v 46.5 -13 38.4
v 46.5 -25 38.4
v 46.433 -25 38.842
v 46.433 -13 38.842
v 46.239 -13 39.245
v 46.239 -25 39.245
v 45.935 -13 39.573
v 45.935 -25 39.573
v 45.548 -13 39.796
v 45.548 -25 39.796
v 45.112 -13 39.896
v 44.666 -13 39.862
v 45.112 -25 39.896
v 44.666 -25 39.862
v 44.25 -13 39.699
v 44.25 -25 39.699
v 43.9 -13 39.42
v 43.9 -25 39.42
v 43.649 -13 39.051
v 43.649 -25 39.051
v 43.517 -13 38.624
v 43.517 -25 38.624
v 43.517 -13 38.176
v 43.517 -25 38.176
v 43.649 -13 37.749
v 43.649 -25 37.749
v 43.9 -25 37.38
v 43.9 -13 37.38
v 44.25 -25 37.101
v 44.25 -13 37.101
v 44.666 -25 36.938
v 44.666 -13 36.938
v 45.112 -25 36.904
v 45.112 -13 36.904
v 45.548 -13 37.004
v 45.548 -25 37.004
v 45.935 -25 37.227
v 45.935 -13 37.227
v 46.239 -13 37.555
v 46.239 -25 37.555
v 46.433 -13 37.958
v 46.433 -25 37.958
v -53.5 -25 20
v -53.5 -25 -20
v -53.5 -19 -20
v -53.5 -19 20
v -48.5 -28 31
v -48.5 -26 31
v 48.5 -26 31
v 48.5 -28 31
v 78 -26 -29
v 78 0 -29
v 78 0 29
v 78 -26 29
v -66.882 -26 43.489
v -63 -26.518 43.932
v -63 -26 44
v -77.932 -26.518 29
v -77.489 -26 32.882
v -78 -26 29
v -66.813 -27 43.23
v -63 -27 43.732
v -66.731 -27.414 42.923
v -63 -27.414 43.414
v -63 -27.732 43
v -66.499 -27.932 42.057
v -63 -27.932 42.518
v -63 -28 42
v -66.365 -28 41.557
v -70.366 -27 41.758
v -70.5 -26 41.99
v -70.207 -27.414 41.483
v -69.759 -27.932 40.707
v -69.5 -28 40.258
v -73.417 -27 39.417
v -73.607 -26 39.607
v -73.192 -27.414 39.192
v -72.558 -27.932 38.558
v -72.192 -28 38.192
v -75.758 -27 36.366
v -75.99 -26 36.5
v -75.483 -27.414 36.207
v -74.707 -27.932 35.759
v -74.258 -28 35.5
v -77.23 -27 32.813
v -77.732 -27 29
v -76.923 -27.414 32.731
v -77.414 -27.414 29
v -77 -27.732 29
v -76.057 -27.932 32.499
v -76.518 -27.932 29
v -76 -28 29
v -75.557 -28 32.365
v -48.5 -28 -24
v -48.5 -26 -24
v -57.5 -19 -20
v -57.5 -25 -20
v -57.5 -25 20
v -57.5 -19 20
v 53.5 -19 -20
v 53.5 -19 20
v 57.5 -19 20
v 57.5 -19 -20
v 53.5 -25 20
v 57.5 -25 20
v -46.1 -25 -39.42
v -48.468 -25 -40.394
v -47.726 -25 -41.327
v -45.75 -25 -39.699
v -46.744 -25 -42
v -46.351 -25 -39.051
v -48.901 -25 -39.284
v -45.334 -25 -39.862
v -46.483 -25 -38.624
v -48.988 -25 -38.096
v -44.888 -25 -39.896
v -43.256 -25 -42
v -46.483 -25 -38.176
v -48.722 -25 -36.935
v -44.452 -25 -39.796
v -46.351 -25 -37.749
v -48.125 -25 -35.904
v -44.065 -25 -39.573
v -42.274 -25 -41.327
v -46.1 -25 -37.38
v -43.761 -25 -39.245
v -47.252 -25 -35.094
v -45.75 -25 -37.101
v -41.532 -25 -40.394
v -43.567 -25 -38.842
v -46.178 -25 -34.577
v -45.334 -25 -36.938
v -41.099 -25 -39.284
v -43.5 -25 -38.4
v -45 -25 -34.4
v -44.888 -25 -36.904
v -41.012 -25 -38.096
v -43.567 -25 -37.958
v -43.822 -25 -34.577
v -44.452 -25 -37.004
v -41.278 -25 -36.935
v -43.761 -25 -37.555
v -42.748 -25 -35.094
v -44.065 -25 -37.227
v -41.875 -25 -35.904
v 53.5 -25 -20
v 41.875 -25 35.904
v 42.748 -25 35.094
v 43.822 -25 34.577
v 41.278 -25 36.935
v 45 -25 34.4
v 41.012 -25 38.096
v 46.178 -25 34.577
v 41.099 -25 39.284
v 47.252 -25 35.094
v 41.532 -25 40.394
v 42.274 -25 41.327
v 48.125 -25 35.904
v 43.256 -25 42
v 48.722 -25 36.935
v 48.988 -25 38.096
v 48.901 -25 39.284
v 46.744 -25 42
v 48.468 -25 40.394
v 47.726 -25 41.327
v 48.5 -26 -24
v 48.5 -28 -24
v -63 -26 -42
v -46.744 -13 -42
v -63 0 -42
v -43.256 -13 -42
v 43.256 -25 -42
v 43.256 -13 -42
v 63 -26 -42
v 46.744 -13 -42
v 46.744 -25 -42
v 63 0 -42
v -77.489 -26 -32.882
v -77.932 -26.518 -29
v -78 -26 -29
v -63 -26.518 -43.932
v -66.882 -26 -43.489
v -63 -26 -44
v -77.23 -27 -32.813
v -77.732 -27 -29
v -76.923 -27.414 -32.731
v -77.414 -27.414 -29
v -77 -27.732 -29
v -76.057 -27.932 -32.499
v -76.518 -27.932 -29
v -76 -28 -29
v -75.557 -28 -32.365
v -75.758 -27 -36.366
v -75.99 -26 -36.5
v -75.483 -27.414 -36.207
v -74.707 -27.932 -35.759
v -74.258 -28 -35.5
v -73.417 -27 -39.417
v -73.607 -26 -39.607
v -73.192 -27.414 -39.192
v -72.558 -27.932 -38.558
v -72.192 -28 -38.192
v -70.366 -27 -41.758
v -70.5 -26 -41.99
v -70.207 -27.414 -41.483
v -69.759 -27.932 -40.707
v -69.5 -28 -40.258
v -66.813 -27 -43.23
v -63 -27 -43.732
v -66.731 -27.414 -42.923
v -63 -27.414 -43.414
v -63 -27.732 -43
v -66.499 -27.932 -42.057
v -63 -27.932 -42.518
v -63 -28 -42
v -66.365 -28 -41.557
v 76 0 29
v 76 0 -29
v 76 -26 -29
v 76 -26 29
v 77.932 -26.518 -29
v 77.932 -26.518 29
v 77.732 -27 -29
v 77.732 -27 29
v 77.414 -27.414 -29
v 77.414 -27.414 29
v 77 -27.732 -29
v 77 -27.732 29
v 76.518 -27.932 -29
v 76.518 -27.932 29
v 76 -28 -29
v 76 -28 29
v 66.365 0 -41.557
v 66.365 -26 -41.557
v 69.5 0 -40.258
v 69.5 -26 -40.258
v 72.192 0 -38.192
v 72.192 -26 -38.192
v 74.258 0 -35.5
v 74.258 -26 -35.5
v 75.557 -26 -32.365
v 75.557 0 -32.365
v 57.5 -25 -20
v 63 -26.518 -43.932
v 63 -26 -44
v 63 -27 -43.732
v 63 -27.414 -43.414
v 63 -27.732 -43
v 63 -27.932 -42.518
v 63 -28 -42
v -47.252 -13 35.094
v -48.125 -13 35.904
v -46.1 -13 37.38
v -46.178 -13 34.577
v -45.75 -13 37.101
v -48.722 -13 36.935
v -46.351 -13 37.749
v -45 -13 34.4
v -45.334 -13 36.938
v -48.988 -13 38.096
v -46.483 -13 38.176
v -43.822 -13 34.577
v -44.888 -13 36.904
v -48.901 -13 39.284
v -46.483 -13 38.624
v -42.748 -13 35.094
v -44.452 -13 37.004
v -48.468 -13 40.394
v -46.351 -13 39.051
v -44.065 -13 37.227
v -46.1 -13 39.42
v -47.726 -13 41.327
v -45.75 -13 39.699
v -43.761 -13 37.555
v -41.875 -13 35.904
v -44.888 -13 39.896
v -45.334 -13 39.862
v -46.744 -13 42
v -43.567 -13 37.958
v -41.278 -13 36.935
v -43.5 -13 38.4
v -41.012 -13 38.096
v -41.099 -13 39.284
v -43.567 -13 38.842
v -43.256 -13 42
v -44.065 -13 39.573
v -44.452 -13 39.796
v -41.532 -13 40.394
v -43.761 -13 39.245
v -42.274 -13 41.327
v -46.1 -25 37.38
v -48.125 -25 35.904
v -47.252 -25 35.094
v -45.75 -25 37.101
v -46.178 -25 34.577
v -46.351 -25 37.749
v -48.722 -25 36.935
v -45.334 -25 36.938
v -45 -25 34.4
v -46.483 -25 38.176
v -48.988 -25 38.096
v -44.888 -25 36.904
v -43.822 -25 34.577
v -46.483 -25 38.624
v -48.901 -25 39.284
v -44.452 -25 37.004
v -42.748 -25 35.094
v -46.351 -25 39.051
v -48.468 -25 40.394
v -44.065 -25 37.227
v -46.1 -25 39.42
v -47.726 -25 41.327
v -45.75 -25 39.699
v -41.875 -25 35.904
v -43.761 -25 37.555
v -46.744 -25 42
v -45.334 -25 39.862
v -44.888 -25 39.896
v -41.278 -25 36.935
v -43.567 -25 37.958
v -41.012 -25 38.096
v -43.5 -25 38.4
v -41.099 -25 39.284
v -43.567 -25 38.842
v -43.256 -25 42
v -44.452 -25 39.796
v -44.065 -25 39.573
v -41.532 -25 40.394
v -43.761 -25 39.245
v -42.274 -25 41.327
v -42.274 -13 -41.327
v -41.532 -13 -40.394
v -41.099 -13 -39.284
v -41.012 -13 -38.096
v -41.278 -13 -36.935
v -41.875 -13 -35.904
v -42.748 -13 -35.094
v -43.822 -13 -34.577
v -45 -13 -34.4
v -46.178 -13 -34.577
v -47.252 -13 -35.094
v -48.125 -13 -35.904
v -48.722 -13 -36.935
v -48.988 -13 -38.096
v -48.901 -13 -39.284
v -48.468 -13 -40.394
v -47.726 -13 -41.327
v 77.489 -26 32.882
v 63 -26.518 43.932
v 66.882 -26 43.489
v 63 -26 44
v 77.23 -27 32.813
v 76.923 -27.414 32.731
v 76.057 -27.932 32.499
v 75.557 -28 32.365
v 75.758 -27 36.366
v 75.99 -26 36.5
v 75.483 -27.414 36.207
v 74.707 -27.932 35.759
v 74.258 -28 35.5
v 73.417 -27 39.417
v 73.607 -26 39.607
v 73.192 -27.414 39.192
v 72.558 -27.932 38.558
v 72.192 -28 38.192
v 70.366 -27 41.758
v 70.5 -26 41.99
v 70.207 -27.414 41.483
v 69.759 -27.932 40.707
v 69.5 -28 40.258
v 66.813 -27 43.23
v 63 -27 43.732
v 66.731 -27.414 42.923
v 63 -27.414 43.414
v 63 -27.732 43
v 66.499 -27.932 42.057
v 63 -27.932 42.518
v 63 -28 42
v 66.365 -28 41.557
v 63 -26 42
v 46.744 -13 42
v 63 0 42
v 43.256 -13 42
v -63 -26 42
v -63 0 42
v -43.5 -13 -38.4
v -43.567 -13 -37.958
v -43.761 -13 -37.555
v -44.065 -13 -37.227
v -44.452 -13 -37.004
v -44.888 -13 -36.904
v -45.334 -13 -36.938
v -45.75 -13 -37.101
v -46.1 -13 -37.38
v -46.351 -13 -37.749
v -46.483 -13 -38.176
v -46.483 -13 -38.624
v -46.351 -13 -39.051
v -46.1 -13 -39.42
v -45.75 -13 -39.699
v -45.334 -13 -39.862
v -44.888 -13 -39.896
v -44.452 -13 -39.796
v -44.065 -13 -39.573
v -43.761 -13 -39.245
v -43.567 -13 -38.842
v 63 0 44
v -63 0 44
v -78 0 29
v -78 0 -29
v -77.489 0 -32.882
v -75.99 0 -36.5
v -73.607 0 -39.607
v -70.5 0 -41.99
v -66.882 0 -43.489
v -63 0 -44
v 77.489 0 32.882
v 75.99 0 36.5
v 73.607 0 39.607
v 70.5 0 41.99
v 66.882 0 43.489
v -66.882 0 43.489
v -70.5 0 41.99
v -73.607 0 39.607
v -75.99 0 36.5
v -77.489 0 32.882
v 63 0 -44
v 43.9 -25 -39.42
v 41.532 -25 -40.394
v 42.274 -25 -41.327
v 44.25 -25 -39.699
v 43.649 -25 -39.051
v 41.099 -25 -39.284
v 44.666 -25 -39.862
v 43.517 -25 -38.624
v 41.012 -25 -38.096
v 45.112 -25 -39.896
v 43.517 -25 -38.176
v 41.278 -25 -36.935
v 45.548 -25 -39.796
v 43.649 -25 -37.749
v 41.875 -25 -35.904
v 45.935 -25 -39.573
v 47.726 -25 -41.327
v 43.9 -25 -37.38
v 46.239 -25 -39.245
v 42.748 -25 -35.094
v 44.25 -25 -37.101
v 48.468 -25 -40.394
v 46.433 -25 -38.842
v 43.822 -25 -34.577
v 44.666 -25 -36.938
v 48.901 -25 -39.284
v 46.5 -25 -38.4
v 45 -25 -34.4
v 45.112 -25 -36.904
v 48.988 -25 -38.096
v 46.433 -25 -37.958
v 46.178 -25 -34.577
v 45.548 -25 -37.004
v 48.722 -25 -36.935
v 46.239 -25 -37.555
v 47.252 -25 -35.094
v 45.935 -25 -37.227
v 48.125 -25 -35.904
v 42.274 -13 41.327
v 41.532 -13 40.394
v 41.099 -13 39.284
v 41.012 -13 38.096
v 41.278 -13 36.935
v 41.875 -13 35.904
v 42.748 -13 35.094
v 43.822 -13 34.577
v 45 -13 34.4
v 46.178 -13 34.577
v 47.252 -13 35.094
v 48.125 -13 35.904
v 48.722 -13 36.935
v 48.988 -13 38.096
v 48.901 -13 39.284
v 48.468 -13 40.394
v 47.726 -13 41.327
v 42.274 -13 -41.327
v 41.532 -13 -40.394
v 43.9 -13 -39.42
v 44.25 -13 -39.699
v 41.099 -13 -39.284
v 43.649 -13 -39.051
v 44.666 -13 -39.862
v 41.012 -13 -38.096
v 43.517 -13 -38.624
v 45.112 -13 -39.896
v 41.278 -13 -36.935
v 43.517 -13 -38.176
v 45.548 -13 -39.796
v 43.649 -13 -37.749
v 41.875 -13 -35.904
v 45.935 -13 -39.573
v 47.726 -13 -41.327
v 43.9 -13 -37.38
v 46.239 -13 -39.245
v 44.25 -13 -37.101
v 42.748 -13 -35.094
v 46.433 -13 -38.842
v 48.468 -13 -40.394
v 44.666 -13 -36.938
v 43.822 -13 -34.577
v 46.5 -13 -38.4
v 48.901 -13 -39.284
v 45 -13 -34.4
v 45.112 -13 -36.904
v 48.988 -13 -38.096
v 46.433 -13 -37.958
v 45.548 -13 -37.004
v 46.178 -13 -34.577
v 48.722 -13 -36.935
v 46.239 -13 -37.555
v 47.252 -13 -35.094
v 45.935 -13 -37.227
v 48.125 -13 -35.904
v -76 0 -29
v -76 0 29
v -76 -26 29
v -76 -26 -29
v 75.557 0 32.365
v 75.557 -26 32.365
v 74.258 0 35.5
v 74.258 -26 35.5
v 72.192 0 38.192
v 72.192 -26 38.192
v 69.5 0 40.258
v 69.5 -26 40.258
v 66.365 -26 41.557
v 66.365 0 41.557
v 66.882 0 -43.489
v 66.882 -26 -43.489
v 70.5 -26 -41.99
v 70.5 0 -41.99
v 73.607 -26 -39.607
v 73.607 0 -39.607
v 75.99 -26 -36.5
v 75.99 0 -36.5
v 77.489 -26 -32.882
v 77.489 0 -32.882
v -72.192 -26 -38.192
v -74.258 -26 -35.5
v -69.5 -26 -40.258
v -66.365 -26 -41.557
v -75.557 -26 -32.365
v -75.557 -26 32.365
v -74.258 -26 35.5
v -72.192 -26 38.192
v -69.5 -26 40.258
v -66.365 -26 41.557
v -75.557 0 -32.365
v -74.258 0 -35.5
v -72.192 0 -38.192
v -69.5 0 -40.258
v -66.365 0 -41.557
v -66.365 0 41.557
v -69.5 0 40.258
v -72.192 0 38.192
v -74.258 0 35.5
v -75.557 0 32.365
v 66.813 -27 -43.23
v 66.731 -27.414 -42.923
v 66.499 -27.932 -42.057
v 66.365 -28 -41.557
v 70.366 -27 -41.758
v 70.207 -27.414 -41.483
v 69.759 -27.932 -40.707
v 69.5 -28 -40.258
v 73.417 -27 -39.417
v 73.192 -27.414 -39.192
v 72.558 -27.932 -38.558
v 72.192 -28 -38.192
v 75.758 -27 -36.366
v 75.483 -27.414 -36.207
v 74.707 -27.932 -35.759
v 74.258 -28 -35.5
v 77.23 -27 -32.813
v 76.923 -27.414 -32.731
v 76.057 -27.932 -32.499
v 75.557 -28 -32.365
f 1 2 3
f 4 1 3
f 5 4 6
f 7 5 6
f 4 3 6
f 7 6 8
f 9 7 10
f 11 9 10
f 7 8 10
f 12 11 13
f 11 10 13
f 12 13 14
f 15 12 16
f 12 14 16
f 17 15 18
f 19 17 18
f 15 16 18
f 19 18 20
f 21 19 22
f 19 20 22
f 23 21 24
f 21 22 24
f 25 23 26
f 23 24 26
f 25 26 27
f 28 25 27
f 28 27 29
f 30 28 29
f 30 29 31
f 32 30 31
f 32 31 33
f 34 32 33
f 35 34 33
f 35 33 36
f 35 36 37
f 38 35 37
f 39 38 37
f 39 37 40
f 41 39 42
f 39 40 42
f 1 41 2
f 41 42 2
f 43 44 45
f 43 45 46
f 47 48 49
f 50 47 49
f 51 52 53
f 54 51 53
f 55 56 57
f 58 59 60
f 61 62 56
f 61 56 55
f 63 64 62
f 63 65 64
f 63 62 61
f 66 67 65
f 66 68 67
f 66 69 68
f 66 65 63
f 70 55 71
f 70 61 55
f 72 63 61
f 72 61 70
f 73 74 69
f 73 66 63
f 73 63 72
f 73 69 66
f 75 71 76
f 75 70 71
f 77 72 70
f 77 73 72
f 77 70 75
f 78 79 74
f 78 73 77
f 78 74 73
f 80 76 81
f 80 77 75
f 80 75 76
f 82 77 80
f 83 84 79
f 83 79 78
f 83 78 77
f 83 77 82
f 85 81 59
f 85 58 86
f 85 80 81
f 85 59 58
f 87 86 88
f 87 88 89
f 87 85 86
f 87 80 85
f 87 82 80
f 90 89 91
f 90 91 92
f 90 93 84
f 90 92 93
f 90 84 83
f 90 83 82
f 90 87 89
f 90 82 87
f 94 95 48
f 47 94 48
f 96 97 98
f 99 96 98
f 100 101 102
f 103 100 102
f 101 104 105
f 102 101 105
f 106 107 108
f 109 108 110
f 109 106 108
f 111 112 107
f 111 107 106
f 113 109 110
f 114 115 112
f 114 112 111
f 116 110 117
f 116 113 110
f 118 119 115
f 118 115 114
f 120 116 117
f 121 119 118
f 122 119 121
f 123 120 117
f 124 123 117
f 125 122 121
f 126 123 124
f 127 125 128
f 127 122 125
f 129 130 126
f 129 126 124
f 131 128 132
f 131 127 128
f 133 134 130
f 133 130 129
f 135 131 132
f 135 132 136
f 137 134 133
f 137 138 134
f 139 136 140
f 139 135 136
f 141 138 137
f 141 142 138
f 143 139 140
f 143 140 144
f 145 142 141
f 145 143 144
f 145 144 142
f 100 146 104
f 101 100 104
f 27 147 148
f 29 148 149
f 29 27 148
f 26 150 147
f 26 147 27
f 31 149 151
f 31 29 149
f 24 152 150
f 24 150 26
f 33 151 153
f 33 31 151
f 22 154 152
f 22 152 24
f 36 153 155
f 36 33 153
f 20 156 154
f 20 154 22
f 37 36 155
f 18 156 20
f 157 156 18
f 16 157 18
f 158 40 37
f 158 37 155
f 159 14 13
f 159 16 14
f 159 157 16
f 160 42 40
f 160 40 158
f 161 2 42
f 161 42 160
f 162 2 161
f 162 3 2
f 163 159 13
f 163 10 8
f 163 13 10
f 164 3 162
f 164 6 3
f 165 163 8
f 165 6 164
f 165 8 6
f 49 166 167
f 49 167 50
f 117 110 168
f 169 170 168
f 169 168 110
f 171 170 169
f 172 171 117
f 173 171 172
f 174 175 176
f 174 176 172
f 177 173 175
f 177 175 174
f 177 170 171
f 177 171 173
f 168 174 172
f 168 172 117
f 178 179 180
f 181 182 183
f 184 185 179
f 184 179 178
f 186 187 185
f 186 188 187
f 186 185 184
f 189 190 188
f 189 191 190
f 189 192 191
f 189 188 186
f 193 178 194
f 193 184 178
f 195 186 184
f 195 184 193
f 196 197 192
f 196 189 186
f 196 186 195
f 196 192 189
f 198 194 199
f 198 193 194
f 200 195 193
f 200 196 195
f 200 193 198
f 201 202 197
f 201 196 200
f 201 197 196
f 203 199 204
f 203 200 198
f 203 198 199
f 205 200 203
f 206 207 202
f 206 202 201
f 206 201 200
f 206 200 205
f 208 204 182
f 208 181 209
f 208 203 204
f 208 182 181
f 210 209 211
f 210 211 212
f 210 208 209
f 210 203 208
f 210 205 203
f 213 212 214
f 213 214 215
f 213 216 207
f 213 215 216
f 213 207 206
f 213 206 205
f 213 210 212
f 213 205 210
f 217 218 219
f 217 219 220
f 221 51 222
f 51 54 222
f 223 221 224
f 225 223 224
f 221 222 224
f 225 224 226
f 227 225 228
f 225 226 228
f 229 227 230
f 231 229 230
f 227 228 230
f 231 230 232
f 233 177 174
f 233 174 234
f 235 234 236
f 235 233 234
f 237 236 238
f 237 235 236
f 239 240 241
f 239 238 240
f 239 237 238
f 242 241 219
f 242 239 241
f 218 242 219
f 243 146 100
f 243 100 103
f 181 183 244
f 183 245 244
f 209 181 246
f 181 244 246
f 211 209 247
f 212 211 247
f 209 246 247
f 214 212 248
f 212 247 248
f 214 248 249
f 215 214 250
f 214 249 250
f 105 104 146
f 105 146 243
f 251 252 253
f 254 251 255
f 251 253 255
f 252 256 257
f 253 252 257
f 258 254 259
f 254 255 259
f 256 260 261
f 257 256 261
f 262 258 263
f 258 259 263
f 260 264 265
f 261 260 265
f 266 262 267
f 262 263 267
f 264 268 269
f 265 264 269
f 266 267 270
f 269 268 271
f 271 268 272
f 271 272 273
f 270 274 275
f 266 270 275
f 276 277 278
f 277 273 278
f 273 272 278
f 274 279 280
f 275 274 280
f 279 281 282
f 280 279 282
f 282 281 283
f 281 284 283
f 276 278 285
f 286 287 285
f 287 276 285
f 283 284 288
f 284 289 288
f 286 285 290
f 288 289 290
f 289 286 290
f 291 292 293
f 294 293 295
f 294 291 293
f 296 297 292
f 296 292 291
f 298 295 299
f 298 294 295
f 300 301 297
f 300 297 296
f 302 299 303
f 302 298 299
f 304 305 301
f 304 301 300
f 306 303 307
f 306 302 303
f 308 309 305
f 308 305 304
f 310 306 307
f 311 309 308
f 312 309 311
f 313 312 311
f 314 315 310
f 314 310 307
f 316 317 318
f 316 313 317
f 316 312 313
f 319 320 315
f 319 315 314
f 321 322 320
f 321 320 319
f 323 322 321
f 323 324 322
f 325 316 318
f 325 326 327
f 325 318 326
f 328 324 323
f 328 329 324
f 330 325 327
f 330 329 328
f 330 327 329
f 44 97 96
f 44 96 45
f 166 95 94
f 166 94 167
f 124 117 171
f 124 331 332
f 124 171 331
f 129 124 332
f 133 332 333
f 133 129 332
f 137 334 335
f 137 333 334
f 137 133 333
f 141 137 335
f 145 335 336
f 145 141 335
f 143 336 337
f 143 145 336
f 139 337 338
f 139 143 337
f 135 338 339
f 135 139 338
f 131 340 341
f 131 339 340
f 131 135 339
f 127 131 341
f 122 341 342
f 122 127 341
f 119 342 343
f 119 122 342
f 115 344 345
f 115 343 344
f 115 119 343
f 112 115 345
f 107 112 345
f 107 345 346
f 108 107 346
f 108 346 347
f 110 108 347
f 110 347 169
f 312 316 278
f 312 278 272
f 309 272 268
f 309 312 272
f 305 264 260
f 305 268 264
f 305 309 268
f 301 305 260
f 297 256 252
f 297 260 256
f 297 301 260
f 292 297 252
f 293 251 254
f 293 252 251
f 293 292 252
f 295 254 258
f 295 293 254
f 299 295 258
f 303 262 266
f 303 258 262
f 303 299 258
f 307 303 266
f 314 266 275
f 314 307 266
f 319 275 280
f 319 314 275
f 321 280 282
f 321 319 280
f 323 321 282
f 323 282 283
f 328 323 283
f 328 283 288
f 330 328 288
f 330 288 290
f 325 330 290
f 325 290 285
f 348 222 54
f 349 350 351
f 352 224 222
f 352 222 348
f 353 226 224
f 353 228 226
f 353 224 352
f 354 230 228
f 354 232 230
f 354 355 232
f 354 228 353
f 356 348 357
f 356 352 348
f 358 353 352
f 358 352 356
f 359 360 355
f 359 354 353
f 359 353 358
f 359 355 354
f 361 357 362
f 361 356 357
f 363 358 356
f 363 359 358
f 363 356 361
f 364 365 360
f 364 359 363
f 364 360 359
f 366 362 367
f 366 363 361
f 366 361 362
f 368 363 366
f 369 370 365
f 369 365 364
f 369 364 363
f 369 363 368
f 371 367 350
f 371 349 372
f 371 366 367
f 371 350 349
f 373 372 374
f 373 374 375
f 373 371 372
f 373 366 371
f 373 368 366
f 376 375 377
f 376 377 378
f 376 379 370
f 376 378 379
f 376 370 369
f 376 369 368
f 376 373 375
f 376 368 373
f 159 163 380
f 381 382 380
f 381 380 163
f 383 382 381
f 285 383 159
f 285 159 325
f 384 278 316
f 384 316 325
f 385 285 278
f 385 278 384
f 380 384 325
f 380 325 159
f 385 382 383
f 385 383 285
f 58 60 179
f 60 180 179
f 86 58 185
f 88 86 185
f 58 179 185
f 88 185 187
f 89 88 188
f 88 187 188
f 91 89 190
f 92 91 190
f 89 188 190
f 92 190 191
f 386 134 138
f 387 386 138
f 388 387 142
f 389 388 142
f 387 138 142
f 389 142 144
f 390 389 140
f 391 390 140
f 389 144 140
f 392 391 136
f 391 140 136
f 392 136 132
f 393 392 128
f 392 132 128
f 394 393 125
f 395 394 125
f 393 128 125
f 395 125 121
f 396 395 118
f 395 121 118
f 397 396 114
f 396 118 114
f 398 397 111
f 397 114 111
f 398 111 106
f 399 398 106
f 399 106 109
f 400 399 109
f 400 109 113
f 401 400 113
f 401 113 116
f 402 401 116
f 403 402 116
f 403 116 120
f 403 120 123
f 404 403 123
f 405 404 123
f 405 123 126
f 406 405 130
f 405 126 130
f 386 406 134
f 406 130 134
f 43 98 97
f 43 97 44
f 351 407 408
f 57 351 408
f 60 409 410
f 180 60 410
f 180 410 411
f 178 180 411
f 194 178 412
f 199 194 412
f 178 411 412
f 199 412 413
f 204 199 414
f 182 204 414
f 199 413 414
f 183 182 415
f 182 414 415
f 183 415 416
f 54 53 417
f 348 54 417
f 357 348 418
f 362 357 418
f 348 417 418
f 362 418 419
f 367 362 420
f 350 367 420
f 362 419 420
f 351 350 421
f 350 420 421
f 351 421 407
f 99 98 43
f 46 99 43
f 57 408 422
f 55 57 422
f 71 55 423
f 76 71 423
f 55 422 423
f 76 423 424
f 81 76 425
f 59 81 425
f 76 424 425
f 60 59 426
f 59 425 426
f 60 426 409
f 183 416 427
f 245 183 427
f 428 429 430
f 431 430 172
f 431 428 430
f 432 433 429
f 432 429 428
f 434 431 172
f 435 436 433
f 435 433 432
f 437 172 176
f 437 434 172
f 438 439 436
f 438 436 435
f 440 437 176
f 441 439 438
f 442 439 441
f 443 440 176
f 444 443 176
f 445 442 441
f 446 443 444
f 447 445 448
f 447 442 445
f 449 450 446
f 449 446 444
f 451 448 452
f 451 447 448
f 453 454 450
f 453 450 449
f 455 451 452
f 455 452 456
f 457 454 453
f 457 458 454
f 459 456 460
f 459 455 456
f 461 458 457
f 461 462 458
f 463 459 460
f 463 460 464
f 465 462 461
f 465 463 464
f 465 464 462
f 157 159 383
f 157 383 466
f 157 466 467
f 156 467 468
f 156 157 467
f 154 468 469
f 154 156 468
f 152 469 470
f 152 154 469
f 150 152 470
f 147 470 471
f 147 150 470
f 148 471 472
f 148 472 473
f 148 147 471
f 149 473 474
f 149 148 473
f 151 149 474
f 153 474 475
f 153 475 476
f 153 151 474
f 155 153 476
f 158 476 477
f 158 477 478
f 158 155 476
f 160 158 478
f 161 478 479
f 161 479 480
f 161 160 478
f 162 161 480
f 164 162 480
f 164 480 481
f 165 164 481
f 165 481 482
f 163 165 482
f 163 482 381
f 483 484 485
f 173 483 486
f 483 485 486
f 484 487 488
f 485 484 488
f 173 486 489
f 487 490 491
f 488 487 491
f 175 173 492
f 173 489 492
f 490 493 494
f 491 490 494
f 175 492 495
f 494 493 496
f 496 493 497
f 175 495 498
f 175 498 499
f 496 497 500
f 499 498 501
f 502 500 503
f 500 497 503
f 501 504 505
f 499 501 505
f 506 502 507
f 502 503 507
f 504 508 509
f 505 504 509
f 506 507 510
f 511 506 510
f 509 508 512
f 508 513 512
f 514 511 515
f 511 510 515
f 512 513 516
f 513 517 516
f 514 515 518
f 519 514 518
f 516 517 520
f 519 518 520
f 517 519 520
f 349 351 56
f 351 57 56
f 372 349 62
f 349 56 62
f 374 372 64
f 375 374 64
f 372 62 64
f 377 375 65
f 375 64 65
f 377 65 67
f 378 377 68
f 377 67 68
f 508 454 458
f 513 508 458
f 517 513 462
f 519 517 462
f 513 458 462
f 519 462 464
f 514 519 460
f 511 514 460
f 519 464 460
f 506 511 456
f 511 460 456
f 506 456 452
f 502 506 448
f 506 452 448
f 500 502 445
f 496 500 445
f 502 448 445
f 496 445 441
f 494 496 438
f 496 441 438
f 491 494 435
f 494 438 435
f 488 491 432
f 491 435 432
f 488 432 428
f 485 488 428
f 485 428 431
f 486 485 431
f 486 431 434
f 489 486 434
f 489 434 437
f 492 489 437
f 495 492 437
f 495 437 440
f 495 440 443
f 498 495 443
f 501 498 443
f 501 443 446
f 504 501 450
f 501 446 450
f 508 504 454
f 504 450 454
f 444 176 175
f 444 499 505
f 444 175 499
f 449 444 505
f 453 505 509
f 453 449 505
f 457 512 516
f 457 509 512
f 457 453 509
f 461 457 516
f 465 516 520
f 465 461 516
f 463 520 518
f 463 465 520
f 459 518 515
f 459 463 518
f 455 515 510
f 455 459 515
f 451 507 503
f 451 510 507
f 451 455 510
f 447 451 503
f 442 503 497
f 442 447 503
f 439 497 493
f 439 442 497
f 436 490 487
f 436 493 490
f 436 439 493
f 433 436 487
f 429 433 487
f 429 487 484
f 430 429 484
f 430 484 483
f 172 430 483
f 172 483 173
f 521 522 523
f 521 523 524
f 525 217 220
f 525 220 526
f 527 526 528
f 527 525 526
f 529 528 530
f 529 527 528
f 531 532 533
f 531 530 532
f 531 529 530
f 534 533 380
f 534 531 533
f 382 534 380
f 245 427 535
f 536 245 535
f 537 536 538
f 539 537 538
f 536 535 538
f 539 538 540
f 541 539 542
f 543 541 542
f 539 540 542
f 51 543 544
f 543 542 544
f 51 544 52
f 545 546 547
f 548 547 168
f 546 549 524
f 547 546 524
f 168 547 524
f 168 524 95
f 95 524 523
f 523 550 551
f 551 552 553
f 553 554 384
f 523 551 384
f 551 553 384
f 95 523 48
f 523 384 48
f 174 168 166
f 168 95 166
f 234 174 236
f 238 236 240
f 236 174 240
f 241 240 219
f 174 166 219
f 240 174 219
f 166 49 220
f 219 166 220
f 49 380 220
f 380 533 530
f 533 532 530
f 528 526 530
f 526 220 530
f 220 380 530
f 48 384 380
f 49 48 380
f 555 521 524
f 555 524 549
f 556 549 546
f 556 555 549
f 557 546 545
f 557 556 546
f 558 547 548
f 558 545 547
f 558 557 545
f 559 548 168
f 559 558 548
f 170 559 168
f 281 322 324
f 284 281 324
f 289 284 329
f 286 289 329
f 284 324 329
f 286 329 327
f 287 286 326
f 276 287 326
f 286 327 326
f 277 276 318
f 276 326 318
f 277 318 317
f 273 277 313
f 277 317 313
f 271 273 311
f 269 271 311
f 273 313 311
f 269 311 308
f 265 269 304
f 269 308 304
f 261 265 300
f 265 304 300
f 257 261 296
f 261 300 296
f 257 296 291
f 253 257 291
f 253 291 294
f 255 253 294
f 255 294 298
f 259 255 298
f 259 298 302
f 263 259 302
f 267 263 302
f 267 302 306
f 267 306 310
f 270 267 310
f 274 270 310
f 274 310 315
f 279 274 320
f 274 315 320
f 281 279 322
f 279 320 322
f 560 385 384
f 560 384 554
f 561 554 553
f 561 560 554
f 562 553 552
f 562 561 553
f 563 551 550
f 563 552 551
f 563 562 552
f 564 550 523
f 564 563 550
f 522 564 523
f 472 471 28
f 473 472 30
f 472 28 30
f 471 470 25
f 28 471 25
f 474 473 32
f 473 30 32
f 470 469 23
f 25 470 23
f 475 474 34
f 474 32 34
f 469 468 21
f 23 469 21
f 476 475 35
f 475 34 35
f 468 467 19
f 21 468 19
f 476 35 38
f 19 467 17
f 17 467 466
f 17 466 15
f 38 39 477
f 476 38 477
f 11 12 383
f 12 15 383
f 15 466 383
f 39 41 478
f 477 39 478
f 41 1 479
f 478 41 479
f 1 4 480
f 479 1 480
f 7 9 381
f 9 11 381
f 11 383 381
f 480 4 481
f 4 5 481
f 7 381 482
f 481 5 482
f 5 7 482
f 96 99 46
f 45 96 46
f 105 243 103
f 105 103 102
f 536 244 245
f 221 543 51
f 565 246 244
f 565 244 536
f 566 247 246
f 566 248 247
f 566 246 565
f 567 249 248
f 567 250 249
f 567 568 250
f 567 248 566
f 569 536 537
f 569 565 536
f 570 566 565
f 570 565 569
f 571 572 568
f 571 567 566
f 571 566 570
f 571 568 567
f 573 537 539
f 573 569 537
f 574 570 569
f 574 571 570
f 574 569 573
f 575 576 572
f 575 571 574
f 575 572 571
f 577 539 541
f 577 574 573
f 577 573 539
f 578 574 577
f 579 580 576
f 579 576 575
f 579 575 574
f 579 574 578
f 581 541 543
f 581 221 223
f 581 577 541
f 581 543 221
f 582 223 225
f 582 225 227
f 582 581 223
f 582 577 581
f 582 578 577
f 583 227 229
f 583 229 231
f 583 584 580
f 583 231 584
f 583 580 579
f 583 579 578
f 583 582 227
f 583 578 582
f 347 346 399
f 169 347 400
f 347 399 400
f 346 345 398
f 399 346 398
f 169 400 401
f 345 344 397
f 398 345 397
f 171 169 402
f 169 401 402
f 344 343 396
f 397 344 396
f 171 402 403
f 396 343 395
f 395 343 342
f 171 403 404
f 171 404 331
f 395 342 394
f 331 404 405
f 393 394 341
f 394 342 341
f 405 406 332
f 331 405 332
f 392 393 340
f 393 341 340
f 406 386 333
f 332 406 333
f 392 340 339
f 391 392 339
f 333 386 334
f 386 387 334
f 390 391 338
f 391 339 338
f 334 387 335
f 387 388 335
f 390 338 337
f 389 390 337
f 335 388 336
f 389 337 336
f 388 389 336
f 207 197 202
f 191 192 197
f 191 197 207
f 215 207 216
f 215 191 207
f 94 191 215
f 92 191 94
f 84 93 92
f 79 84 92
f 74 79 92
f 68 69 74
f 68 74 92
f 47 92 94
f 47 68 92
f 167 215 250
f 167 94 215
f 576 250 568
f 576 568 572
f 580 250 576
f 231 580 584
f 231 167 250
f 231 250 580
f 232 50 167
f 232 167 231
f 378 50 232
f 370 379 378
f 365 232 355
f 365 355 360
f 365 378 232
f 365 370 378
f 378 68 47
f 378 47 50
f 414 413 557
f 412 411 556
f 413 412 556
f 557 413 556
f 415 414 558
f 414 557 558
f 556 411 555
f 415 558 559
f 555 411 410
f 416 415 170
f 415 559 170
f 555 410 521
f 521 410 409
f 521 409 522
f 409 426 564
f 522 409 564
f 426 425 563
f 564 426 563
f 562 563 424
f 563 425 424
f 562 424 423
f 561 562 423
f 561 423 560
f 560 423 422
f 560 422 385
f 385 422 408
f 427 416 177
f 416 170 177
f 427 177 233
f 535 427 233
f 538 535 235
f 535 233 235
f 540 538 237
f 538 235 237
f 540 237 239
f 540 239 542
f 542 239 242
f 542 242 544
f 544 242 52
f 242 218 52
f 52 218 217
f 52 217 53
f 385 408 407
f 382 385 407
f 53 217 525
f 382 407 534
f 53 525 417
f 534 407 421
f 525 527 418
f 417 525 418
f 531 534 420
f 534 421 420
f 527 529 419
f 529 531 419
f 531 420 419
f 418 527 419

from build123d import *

# Parameters (mm, degrees)
F1_DEPTH  = 28
F2_T      = -2
F4_W      = 97
F4_H      = 55
F5_DEPTH  = 50
F6_W      = 4
F6_H      = 40
F7_DEPTH  = 6
F8_R      = 2
F10_R     = 4
F10_R_2   = 1.5
F11_DEPTH = 12


with BuildPart() as f1:
    # F0 (on Front) → F1 (new body)
    with BuildSketch(Plane.XZ):
        with BuildLine():
            Line((63, 44), (-63, 44))
            ThreePointArc((-63, 44), (-73.606602, 39.606602), (-78, 29))
            Line((-78, 29), (-78, -29))
            ThreePointArc((-78, -29), (-73.606602, -39.606602), (-63, -44))
            Line((-63, -44), (63, -44))
            ThreePointArc((63, -44), (73.606602, -39.606602), (78, -29))
            Line((78, -29), (78, 29))
            ThreePointArc((78, 29), (73.606602, 39.606602), (63, 44))
        make_face()
    extrude(amount=F1_DEPTH)

    # F2
    f2_openings = [f1.faces().sort_by_distance(p)[0] for p in [
        (0, 0, 0),
    ]]
    offset(amount=F2_T, openings=f2_openings)

    # F4 (on Front) → F5 (cut)
    with BuildSketch(Plane.XZ):
        with Locations((0, 3.5)):
            Rectangle(F4_W, F4_H)
    extrude(amount=F5_DEPTH, mode=Mode.SUBTRACT)

    # F8
    f8_edges = [f1.edges().sort_by_distance(p)[0] for p in [
        (0, -28, 44),
        (78, -28, 0),
    ]]
    fillet(f8_edges, radius=F8_R)

    # F10 (on offset) → F11 (join)
    with BuildSketch(Plane.XZ.offset(25)):
        with Locations((45, 38.4)):
            Circle(F10_R)
        with Locations((45, 38.4)):
            Circle(F10_R_2, mode=Mode.SUBTRACT)
        with Locations((-45, 38.4)):
            Circle(F10_R)
        with Locations((-45, 38.4)):
            Circle(F10_R_2, mode=Mode.SUBTRACT)
        with Locations((45, -38.4)):
            Circle(F10_R)
        with Locations((45, -38.4)):
            Circle(F10_R_2, mode=Mode.SUBTRACT)
        with Locations((-45, -38.4)):
            Circle(F10_R)
        with Locations((-45, -38.4)):
            Circle(F10_R_2, mode=Mode.SUBTRACT)
    extrude(amount=-F11_DEPTH)


with BuildPart() as f7:
    # F6 (on offset) → F7 (new body)
    with BuildSketch(Plane.XZ.offset(25)):
        with Locations((55.5, 0)):
            Rectangle(F6_W, F6_H)
        with Locations((-55.5, 0)):
            Rectangle(F6_W, F6_H)
    extrude(amount=-F7_DEPTH)


solid = Compound([f1.part, f7.part])
